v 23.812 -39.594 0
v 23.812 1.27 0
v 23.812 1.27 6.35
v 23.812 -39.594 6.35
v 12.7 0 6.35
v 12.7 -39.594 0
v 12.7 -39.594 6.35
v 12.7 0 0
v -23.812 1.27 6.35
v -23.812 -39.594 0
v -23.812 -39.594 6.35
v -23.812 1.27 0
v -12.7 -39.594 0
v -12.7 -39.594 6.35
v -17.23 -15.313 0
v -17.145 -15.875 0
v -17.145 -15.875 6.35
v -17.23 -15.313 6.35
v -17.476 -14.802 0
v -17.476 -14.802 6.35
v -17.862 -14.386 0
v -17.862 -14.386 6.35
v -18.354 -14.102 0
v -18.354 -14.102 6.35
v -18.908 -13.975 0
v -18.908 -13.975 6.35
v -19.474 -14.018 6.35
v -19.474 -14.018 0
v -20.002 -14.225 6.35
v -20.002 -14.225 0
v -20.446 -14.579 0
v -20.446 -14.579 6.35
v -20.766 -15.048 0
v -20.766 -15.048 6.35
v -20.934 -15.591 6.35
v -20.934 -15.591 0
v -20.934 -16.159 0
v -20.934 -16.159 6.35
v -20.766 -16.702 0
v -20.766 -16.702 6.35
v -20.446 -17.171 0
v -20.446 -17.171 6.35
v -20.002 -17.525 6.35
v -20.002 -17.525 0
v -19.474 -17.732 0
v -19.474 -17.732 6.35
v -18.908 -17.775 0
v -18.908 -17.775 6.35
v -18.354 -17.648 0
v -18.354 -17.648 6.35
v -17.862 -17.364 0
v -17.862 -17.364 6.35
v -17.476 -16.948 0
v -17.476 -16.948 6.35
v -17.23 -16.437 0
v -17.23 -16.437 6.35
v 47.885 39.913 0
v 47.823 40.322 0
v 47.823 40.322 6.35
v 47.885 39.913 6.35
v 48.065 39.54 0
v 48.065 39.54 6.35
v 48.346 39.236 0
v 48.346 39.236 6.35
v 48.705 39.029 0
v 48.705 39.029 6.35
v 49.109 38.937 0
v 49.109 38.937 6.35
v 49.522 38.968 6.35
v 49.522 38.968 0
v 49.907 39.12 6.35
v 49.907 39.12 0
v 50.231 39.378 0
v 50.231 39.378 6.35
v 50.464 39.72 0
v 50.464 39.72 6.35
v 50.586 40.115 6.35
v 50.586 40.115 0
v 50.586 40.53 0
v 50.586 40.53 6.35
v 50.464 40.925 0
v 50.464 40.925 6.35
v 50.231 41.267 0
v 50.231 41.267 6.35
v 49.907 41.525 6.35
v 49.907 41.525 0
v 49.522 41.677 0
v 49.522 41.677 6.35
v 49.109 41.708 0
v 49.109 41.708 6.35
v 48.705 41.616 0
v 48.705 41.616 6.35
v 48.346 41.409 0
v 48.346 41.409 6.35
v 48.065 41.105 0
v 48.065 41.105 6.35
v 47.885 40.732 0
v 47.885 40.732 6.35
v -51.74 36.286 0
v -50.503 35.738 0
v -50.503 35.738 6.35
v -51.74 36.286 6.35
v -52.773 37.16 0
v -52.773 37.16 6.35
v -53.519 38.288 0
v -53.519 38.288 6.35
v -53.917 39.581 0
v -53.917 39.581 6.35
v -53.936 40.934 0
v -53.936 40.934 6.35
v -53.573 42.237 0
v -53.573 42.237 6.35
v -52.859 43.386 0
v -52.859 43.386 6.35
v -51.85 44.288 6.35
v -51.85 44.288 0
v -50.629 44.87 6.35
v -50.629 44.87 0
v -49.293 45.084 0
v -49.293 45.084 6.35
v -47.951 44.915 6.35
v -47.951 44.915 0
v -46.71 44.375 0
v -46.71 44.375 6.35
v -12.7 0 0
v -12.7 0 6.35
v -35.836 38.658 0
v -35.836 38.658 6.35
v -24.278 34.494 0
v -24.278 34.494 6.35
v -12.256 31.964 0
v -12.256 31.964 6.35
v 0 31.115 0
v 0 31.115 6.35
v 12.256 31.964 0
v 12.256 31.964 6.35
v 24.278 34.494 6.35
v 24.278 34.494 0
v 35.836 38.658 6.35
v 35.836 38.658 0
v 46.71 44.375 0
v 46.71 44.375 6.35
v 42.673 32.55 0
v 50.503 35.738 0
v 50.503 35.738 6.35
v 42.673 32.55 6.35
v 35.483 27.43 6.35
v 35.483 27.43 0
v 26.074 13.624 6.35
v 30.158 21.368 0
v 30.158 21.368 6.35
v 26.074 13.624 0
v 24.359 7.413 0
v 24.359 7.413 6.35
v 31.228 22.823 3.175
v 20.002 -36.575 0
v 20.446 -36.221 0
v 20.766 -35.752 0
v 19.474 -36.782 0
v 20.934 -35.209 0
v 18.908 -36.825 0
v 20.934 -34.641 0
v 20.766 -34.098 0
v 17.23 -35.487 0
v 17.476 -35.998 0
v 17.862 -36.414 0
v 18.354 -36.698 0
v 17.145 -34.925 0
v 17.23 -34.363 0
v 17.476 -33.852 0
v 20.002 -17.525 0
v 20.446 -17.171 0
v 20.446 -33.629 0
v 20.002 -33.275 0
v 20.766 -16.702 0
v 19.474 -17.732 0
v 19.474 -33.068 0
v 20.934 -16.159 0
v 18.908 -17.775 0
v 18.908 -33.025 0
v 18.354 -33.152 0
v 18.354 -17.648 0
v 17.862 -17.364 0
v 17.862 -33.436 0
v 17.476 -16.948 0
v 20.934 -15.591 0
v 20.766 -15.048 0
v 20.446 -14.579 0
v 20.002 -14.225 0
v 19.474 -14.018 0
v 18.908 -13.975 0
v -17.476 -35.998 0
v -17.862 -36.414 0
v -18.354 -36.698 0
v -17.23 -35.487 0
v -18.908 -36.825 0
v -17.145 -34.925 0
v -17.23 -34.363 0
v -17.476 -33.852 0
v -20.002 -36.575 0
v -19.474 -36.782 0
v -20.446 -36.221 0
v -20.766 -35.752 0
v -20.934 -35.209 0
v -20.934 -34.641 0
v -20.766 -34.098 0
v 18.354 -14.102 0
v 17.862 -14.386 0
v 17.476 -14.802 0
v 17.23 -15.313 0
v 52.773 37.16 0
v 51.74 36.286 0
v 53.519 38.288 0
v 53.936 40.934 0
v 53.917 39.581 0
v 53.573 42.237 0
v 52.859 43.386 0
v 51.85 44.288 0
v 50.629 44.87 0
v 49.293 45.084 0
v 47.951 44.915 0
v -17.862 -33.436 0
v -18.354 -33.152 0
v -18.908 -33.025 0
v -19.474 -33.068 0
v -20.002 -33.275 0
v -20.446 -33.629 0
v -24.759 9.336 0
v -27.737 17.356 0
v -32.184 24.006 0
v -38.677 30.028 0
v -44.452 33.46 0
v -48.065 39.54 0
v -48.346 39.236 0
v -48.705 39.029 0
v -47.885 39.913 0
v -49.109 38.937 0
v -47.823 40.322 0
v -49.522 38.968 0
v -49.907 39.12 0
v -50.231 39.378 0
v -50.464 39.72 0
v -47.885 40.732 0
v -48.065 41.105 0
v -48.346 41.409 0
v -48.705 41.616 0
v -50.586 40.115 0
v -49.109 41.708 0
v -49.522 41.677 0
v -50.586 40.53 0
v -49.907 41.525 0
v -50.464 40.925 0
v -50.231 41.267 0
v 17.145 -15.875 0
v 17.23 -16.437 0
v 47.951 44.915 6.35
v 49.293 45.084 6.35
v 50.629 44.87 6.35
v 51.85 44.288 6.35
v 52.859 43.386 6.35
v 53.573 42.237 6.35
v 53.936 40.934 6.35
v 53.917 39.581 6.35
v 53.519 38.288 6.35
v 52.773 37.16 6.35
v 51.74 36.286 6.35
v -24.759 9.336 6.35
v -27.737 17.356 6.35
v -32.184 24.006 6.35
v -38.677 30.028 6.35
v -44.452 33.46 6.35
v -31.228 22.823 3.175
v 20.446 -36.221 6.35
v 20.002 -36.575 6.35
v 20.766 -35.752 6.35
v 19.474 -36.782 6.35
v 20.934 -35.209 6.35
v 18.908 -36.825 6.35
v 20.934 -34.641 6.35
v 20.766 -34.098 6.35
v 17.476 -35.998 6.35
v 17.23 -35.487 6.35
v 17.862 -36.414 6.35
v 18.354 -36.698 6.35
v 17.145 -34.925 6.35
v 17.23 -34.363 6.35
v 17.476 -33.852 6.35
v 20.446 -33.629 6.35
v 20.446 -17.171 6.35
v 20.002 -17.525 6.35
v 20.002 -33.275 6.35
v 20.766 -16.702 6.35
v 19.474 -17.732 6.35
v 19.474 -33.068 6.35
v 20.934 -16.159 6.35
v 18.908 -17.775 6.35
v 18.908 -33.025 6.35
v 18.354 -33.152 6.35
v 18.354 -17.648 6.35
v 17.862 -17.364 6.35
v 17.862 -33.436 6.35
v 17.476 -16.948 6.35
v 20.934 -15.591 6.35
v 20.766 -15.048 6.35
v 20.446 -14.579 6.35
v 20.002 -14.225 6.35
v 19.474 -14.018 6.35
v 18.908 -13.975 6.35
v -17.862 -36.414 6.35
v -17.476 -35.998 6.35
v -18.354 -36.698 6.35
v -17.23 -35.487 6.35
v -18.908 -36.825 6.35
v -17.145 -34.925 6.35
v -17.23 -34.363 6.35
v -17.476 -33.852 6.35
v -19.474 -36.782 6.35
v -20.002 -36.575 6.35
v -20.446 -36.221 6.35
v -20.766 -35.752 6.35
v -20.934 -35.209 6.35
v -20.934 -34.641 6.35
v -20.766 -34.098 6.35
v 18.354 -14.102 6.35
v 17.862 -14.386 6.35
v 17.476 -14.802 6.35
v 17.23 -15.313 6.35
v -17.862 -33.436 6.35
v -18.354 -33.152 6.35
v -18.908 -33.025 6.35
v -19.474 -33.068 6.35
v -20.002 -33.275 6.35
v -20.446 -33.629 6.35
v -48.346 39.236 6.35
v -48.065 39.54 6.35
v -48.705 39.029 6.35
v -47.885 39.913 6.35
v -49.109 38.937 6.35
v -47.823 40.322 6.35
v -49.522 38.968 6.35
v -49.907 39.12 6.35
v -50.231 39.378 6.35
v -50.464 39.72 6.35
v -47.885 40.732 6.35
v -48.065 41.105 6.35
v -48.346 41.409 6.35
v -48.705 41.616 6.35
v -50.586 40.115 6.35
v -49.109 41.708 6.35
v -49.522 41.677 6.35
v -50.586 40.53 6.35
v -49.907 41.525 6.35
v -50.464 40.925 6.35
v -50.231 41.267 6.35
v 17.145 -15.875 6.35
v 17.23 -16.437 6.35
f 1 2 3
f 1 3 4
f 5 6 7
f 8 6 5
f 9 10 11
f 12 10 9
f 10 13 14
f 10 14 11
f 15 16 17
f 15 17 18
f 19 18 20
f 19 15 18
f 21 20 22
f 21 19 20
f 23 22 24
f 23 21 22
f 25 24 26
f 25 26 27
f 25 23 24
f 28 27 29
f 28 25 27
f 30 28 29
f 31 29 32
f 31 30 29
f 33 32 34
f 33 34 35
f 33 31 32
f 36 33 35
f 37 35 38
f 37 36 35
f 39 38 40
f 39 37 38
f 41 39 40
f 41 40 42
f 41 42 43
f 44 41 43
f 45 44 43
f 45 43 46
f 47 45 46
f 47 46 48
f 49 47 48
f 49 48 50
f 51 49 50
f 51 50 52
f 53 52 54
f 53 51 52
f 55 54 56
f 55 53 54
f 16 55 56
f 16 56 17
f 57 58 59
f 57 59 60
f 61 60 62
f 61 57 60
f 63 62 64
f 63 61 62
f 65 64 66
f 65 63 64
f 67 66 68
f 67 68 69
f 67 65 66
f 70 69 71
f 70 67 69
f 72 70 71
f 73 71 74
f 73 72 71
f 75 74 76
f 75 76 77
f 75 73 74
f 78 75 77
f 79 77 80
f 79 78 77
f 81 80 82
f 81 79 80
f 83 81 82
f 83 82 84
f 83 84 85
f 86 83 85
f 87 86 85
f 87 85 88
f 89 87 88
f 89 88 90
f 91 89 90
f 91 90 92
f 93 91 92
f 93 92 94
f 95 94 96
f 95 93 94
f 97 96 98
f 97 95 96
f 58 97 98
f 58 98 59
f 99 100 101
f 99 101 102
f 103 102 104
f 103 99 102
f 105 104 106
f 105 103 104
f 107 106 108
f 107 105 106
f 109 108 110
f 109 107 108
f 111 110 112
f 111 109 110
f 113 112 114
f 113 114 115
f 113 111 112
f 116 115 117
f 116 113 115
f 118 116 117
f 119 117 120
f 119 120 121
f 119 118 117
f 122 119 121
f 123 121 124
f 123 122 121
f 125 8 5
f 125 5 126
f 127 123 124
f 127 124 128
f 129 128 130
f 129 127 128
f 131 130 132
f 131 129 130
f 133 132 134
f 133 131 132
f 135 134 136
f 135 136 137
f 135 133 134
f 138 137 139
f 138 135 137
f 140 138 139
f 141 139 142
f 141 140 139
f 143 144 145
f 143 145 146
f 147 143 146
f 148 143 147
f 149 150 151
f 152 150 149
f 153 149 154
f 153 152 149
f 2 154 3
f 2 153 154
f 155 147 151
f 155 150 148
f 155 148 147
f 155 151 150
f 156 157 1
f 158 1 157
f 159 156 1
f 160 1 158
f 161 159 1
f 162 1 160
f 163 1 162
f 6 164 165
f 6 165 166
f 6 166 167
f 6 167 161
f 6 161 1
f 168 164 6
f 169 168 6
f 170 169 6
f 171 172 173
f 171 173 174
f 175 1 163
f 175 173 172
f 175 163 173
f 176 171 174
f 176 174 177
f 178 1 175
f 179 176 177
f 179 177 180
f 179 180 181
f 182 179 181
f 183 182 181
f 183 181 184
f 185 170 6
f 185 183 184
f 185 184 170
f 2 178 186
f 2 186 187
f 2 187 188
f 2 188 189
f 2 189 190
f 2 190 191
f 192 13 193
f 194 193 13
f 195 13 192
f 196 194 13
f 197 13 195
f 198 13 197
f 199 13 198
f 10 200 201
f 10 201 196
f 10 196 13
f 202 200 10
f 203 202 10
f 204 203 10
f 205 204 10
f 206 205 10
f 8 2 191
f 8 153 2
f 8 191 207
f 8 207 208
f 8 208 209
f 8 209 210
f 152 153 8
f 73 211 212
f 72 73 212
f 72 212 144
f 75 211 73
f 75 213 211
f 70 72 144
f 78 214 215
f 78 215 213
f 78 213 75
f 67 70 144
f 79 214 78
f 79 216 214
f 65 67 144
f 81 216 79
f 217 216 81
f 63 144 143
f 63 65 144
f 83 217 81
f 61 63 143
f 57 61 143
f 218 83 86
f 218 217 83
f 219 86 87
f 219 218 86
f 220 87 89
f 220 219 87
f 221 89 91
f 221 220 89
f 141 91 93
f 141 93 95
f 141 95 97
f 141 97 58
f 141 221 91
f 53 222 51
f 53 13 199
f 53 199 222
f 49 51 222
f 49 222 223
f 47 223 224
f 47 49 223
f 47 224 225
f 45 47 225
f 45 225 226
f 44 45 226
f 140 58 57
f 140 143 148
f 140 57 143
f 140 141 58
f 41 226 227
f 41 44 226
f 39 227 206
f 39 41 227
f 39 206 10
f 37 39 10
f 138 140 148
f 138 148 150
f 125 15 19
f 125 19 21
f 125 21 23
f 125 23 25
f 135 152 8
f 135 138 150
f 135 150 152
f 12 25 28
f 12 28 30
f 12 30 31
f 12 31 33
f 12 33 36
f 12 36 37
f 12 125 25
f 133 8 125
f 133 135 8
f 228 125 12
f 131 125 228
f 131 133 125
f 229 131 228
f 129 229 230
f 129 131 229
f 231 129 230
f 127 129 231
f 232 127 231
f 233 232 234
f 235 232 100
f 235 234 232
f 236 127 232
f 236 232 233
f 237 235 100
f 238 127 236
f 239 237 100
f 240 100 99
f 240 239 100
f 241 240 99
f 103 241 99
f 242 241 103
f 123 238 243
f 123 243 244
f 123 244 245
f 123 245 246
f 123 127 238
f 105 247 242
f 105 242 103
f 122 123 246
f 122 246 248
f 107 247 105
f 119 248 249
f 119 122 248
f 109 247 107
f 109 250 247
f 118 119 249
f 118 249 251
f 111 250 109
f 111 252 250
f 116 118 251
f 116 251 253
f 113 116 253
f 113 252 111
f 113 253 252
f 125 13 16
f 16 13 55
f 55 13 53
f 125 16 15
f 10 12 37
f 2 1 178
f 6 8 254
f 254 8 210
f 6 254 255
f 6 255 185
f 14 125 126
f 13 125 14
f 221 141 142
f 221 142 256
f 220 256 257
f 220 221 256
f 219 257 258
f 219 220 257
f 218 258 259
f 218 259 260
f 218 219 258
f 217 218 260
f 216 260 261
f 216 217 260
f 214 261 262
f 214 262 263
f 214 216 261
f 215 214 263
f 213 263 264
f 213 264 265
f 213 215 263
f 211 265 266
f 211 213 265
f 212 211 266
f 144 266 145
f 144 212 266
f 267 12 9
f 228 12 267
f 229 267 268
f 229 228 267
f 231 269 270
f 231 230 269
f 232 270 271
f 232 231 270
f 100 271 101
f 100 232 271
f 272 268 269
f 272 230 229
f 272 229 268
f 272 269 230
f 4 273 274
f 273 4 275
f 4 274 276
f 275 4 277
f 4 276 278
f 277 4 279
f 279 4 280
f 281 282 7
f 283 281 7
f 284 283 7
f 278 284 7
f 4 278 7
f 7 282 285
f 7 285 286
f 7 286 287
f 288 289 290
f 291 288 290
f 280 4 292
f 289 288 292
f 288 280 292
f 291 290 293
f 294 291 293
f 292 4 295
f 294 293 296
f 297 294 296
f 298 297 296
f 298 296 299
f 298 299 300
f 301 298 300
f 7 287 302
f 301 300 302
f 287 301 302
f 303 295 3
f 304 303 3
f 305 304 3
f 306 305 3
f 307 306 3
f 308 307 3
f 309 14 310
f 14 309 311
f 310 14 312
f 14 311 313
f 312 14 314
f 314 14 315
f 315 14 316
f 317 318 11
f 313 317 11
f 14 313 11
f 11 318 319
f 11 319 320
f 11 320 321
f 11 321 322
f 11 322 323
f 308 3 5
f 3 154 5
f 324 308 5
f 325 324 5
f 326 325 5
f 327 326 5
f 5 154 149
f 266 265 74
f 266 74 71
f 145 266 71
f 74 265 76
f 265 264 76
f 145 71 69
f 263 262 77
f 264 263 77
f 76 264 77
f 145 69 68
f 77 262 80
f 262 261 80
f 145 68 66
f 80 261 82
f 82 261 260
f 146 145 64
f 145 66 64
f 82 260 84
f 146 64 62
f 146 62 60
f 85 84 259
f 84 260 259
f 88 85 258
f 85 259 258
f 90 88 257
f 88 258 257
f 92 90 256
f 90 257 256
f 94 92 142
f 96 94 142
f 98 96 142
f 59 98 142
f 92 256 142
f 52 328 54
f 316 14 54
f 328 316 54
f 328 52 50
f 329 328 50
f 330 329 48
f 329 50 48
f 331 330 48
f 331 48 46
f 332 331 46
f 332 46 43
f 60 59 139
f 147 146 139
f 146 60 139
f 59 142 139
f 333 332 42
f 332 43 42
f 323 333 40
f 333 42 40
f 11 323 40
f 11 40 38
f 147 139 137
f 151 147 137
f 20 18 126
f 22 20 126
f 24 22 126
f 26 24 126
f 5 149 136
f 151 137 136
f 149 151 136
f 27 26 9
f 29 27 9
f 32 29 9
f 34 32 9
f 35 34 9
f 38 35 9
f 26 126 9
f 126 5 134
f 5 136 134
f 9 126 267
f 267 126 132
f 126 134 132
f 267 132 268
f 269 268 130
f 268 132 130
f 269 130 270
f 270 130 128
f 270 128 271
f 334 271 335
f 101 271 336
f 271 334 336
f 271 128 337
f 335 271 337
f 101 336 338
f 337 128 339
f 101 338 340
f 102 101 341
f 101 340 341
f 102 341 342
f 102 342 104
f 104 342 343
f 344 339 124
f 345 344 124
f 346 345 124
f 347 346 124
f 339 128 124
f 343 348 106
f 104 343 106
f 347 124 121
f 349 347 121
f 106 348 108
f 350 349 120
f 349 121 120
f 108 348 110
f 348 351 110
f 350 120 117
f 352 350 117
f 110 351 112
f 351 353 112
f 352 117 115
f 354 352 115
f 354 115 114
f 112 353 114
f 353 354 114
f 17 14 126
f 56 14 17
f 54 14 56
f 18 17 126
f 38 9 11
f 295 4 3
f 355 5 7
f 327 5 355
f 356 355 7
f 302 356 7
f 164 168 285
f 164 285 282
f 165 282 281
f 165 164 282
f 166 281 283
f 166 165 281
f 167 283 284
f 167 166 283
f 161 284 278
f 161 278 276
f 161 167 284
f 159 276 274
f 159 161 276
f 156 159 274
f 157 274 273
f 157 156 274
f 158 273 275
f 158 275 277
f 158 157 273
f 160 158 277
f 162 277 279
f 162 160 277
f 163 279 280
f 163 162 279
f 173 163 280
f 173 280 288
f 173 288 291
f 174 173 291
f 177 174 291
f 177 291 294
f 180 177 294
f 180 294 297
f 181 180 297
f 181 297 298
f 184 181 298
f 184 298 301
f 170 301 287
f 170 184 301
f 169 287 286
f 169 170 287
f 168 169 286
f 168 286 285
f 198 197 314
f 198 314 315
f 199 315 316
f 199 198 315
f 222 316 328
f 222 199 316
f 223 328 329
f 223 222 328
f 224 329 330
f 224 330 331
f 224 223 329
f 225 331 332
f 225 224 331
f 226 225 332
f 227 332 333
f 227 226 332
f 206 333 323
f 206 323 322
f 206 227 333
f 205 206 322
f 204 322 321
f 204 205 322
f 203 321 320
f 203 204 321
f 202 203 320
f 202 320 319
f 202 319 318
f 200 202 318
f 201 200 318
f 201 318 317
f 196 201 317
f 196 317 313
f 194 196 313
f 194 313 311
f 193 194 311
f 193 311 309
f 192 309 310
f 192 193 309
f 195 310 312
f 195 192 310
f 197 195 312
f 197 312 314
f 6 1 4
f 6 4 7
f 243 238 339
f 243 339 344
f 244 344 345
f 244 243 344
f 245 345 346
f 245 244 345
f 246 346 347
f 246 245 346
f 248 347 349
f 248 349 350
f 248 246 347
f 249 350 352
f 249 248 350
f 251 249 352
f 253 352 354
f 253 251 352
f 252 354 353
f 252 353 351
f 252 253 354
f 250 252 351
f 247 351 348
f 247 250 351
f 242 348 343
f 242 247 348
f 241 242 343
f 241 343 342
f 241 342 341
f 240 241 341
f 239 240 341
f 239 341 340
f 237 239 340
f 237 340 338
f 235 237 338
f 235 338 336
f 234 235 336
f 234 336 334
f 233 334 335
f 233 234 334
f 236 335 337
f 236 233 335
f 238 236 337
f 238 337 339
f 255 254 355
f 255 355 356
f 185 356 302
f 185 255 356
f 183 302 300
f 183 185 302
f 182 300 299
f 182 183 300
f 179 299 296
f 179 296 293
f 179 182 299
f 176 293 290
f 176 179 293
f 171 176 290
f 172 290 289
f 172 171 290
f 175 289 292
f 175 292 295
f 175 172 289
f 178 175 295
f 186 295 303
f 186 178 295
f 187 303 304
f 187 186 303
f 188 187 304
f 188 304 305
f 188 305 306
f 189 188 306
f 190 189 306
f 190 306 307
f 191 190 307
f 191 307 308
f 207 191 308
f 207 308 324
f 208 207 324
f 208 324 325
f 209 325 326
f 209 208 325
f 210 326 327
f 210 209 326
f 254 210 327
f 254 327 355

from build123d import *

# Parameters (mm, degrees)
SKETCH1_R           = 1.905
SKETCH1_R_2         = 1.3890625
BOSS_EXTRUDE1_DEPTH = 6.35


with BuildPart() as part:
    # Sketch1 → Boss-Extrude1 (new body)
    with BuildSketch(Plane.XY):
        with BuildLine():
            Line((12.7, 0), (-12.7, 0))
            Line((-12.7, 0), (-12.7, -39.593860647))
            Line((-12.7, -39.593860647), (-23.8125, -39.593860647))
            Line((-23.8125, -39.593860647), (-23.8125, 1.27))
            add(Edge.make_bspline(
                [(-23.8125, 1.27), (-23.8125, 28.224807165), (-50.502986928, 35.738173469)],
                knots=[0, 0, 0, 1.28831511, 1.28831511, 1.28831511], degree=2, weights=[1, 0.79960596, 1]))
            ThreePointArc((-50.502986928, 35.738173469), (-53.573053894, 42.237434983), (-46.71026588, 44.374688379))
            ThreePointArc((-46.71026588, 44.374688379), (0, 31.115), (46.71026588, 44.374688379))
            ThreePointArc((46.71026588, 44.374688379), (53.573053894, 42.237434983), (50.502986928, 35.738173469))
            add(Edge.make_bspline(
                [(50.502986928, 35.738173469), (23.8125, 28.224807165), (23.8125, 1.27)],
                knots=[1.853277544, 1.853277544, 1.853277544, 3.141592654, 3.141592654, 3.141592654], degree=2, weights=[1, 0.79960596, 1]))
            Line((23.8125, 1.27), (23.8125, -5.08))
            Line((23.8125, -5.08), (23.8125, -39.593860647))
            Line((23.8125, -39.593860647), (12.7, -39.593860647))
            Line((12.7, -39.593860647), (12.7, 0))
        make_face()
        with Locations((-19.05, -15.875)):
            Circle(SKETCH1_R, mode=Mode.SUBTRACT)
        with Locations(Location((19.05, -15.875, 0), (0, 0, 180))):
            Circle(SKETCH1_R, mode=Mode.SUBTRACT)
        with Locations((-49.2125, 40.3225)):
            Circle(SKETCH1_R_2, mode=Mode.SUBTRACT)
        with Locations((-19.05, -34.925)):
            Circle(SKETCH1_R, mode=Mode.SUBTRACT)
        with Locations(Location((19.05, -34.925, 0), (0, 0, 180))):
            Circle(SKETCH1_R, mode=Mode.SUBTRACT)
        with Locations(Location((49.2125, 40.3225, 0), (0, 0, 180))):
            Circle(SKETCH1_R_2, mode=Mode.SUBTRACT)
    extrude(amount=BOSS_EXTRUDE1_DEPTH)


solid = part.part
